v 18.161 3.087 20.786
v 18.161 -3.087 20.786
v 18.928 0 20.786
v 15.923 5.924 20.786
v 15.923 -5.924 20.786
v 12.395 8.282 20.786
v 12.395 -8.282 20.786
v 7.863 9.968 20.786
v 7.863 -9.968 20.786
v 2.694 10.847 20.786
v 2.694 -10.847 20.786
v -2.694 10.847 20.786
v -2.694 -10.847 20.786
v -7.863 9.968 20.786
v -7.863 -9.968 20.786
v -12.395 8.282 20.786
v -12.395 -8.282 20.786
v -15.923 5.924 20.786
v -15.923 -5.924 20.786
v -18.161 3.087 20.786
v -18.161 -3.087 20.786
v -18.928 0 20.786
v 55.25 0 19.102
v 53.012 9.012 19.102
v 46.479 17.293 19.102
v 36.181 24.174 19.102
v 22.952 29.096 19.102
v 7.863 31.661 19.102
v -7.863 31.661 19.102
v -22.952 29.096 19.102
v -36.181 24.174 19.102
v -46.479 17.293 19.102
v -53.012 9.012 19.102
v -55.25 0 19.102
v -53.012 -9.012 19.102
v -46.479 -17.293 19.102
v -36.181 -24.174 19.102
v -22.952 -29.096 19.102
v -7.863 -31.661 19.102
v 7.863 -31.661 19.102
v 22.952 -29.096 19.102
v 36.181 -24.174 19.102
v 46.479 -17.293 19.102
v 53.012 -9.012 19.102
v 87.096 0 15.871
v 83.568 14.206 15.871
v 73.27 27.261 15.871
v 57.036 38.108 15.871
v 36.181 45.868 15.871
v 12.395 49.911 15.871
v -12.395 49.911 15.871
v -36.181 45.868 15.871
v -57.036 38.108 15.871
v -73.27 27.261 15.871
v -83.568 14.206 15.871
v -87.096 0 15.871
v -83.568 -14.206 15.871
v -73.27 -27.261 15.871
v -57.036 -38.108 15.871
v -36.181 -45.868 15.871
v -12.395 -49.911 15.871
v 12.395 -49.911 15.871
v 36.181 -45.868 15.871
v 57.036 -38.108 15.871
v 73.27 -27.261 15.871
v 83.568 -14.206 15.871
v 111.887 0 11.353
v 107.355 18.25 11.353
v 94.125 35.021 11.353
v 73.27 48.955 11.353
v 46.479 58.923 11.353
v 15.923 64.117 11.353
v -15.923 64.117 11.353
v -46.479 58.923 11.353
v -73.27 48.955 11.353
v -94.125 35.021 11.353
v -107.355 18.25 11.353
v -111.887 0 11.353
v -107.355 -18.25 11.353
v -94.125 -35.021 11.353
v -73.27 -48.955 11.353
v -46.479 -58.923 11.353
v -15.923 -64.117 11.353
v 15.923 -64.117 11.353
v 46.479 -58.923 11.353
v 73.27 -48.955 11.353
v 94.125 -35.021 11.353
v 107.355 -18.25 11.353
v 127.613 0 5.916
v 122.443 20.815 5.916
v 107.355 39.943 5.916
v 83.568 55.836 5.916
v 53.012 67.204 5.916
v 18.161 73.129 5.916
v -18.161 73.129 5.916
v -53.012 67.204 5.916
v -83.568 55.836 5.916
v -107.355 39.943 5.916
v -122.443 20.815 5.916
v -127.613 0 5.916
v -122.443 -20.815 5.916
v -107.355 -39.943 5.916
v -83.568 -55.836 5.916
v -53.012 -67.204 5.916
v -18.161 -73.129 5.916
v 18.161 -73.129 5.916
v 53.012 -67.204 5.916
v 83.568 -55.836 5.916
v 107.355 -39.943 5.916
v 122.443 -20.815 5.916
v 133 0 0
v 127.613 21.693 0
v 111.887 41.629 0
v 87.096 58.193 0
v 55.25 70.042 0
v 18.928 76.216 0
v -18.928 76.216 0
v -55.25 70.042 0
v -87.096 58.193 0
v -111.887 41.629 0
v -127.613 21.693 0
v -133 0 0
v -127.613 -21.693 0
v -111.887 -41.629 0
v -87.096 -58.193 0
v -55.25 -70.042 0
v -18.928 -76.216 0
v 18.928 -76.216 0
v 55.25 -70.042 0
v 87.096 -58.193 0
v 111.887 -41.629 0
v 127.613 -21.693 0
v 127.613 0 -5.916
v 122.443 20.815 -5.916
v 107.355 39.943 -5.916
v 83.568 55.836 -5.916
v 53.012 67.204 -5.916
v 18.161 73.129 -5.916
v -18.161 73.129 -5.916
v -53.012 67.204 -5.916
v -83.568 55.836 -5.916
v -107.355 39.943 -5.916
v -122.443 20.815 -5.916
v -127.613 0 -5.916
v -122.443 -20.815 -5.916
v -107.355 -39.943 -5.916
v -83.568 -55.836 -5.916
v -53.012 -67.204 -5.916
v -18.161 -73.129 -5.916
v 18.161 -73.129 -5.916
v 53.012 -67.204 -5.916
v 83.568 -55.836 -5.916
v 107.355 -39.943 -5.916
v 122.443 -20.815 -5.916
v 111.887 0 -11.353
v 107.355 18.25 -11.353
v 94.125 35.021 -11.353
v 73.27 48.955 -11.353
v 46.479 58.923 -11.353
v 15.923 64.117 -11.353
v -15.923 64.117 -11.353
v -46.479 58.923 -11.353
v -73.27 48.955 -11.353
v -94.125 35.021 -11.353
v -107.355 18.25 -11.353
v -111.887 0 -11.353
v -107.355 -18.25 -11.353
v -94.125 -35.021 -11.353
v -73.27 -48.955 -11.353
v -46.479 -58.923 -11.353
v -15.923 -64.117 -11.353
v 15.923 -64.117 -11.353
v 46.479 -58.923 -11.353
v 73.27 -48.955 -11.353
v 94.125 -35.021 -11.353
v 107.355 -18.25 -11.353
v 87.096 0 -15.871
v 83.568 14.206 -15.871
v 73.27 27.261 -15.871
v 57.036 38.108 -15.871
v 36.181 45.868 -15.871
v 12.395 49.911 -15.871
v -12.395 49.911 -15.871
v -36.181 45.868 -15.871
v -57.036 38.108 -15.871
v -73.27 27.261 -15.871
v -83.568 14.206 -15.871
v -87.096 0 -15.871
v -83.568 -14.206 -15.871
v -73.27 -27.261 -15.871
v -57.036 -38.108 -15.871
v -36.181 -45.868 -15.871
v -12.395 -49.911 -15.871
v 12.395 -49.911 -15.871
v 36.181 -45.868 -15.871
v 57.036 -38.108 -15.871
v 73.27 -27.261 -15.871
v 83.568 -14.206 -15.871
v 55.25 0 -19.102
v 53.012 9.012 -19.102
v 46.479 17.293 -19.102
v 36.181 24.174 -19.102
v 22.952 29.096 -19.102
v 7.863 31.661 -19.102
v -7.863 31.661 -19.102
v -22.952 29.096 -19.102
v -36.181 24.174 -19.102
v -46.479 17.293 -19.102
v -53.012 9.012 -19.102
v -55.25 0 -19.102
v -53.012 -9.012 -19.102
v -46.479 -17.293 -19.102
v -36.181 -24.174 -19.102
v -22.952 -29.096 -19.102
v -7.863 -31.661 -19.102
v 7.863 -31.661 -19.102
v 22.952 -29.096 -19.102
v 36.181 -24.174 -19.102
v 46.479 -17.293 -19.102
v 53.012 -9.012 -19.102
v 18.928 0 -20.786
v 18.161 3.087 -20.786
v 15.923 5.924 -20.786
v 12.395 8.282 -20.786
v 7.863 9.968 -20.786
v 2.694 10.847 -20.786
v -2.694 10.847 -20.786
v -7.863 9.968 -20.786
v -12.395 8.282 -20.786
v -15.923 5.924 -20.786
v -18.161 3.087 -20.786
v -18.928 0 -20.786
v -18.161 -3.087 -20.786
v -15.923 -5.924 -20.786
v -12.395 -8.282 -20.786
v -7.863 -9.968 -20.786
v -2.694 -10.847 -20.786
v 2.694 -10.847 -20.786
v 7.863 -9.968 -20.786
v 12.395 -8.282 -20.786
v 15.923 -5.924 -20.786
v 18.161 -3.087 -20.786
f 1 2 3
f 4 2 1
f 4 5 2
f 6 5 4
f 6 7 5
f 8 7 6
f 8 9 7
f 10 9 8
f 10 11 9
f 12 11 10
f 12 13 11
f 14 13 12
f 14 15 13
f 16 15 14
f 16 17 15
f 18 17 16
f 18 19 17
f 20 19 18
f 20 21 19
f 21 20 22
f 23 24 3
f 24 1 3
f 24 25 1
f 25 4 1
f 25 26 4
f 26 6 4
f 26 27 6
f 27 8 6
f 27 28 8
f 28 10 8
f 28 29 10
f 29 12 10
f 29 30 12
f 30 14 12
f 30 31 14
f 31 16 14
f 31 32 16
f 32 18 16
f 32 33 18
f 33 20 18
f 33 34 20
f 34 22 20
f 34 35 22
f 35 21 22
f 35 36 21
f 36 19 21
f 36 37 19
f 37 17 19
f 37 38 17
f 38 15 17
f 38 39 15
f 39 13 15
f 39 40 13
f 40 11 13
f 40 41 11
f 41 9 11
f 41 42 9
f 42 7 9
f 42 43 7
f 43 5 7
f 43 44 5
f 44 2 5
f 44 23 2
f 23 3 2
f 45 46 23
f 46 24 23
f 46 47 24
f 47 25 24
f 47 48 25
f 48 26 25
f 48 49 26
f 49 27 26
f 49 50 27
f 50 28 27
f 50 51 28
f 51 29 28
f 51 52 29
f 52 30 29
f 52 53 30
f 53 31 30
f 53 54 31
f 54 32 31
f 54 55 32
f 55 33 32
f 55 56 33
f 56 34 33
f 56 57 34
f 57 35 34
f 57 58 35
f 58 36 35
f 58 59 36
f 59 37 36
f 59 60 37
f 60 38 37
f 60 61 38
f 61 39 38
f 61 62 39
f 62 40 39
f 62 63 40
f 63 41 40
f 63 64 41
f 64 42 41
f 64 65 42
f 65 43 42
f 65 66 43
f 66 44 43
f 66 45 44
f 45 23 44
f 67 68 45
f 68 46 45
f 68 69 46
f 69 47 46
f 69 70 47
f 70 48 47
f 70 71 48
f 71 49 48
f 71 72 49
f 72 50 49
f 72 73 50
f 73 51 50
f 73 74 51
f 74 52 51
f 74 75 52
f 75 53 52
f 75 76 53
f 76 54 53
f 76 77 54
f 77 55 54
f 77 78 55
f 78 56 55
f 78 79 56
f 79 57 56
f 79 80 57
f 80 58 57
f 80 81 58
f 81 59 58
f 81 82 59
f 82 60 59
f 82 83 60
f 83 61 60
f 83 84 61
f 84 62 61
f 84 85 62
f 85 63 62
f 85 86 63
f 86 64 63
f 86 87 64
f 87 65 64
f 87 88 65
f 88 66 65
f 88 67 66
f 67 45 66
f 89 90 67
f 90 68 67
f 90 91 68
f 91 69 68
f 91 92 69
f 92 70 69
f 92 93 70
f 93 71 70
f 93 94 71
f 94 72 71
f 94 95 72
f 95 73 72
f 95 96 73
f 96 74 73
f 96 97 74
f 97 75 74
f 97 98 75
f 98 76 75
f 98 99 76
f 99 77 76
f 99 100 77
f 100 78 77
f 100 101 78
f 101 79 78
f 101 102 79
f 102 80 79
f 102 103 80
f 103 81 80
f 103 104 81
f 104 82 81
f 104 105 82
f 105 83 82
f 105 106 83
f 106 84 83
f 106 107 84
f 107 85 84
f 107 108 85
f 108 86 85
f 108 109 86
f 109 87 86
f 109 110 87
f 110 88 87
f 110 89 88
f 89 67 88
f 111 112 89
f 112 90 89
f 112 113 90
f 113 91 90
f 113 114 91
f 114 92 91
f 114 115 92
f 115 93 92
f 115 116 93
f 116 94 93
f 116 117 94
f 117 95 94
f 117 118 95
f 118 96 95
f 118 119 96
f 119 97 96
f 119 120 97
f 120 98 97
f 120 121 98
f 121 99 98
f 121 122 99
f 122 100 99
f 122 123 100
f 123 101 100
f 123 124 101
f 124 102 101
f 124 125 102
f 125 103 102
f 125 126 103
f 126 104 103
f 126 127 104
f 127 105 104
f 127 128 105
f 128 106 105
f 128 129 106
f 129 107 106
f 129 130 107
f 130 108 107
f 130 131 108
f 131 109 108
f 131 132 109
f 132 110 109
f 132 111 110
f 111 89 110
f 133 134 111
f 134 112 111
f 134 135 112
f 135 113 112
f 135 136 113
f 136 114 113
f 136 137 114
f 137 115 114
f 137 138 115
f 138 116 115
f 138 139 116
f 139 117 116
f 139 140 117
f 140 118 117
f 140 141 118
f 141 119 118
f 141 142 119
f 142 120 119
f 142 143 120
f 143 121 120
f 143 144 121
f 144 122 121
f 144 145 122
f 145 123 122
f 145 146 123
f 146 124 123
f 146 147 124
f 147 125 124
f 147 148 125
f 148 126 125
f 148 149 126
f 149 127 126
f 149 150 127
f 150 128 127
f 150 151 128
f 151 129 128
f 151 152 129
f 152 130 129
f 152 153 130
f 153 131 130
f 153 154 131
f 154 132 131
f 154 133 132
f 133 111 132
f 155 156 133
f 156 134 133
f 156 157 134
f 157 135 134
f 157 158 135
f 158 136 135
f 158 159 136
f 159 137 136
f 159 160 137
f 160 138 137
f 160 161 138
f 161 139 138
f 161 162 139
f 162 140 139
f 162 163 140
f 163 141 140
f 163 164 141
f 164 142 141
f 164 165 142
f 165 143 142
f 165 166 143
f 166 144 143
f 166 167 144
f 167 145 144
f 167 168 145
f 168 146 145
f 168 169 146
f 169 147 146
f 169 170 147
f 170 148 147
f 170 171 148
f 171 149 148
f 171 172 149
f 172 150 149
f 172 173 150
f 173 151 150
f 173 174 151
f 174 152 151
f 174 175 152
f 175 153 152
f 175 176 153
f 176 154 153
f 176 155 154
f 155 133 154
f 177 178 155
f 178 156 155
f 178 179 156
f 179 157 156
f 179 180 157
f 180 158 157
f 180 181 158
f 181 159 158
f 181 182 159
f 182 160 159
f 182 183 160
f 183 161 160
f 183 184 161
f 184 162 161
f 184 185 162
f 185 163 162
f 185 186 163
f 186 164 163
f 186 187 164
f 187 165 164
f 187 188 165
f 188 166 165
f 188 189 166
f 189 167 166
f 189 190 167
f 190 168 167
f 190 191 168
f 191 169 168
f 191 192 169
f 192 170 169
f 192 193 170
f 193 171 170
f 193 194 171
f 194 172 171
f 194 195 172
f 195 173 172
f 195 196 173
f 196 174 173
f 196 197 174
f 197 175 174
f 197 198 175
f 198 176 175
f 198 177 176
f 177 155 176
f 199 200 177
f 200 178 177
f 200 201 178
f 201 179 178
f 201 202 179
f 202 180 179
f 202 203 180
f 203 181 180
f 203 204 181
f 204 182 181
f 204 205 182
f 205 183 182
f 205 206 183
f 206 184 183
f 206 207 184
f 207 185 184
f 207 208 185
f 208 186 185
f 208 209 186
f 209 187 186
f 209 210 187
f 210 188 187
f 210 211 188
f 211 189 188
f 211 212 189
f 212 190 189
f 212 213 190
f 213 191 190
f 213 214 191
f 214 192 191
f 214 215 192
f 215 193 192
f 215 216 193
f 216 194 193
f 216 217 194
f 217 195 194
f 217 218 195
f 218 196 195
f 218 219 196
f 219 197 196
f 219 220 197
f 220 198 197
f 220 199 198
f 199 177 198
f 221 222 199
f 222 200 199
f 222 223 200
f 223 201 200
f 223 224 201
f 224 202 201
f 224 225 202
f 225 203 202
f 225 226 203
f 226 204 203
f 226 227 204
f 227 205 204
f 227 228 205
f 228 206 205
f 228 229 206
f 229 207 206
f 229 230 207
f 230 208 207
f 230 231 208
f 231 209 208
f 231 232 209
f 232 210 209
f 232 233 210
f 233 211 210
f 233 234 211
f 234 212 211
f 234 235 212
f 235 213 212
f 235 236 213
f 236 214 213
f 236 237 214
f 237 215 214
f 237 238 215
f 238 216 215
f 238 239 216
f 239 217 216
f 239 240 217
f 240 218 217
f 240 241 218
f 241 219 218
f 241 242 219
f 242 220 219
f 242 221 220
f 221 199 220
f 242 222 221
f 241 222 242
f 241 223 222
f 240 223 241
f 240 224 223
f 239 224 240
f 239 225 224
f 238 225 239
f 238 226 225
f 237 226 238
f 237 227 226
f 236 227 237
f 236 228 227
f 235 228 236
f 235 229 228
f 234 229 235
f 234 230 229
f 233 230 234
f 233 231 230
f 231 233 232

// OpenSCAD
// Generated by SolidPython 1.0.1 on 2020-07-29 00:46:54


scale(v = [19, 11, 3]) {
	sphere(r = 7);
}
/***********************************************
*********      SolidPython code:      **********
************************************************
 
# import packages: SolidPython
from solid import *
from solid.utils import *
from itertools import chain, combinations, permutations


class Resize:

    def __init__(self, scad_file):
        self.scad_file = scad_file
        #self.scad_file = import_scad(scad_file)
        # cone/cylinder param:
        self.r1 = 0
        self.r2 = 0
        self.h = 0
        # rectangular prism param:
        self.w = 0
        self.l = 0
        # ellipse param:
        self.r = 0

    # import OpenScad code (file name corresponds to shape)


    # classify shape + parameters
    def assign(self, param1, param2, param3):
        if self.scad_file == 'cone.scad':
            self.r1 = param1
            self.r2 = param2
            self.h = param3
        elif self.scad_file == 'cylinder.scad':
            self.r1 = param1
            self.r2 = param2
            self.h = param3
        elif self.scad_file == 'rectangularPrism.scad':
            self.h = param1
            self.l = param2
            self.w = param3
        else:
            self.r = param1
            self.h = param2

    # resize parameters
    def iterate(self):
        x = range(3, 20, 2)
        i = 1
        if self.scad_file == 'cone.scad':
            tempList = list(permutations(x, 2))
            for temp in tempList:
                param1 = temp[0]
                param2 = temp[1]
                filepath = 'produced_scad_files/' + 'cone' + str(param1) + '_' + str(param2) + '_' + '.scad'
                scad_render_to_file(cylinder(h=param1, r1=param2, r2=0), filepath)

        elif self.scad_file == 'cylinder.scad':
            tempList = list(permutations(x, 3))
            for temp in tempList:
                param1 = temp[0]
                param2 = temp[1]
                filepath = 'produced_scad_files/' + 'cylinder' + str(param1) + '_' + str(param2) + '_' + '.scad'
                scad_render_to_file(cylinder(h=param1, r1=param2, r2=param2), filepath)

        elif self.scad_file == 'rectangularPrism.scad':
            tempList = list(permutations(x, 3))
            for temp in tempList:
                param1 = temp[0]
                param2 = temp[1]
                param3 = temp[2]
                filepath = 'produced_scad_files/' + 'rectangularPrism' + str(param1) + '_' + str(param2) + '_' + str(
                    param3) + '.scad'
                scad_render_to_file(cube(size=(param1, param2, param3)), filepath)

        elif self.scad_file == 'ellipse.scad':
            tempList = list(permutations(x, 4))
            for temp in tempList:
                param1 = temp[0]
                param2 = temp[1]
                param3 = temp[2]
                param4 = temp[3]
                filepath = 'produced_scad_files/' + 'ellipse' + str(param1) + '_' + str(param2) + '_' + str(param3) + '_' + str(param4) + '.scad'
                scad_render_to_file(scale([param1, param2, param3])(sphere(r=param4)), filepath)

    def render_to_scadfile(self):
        scad_render_to_file(scad, 'example.scad') 
 
************************************************/
